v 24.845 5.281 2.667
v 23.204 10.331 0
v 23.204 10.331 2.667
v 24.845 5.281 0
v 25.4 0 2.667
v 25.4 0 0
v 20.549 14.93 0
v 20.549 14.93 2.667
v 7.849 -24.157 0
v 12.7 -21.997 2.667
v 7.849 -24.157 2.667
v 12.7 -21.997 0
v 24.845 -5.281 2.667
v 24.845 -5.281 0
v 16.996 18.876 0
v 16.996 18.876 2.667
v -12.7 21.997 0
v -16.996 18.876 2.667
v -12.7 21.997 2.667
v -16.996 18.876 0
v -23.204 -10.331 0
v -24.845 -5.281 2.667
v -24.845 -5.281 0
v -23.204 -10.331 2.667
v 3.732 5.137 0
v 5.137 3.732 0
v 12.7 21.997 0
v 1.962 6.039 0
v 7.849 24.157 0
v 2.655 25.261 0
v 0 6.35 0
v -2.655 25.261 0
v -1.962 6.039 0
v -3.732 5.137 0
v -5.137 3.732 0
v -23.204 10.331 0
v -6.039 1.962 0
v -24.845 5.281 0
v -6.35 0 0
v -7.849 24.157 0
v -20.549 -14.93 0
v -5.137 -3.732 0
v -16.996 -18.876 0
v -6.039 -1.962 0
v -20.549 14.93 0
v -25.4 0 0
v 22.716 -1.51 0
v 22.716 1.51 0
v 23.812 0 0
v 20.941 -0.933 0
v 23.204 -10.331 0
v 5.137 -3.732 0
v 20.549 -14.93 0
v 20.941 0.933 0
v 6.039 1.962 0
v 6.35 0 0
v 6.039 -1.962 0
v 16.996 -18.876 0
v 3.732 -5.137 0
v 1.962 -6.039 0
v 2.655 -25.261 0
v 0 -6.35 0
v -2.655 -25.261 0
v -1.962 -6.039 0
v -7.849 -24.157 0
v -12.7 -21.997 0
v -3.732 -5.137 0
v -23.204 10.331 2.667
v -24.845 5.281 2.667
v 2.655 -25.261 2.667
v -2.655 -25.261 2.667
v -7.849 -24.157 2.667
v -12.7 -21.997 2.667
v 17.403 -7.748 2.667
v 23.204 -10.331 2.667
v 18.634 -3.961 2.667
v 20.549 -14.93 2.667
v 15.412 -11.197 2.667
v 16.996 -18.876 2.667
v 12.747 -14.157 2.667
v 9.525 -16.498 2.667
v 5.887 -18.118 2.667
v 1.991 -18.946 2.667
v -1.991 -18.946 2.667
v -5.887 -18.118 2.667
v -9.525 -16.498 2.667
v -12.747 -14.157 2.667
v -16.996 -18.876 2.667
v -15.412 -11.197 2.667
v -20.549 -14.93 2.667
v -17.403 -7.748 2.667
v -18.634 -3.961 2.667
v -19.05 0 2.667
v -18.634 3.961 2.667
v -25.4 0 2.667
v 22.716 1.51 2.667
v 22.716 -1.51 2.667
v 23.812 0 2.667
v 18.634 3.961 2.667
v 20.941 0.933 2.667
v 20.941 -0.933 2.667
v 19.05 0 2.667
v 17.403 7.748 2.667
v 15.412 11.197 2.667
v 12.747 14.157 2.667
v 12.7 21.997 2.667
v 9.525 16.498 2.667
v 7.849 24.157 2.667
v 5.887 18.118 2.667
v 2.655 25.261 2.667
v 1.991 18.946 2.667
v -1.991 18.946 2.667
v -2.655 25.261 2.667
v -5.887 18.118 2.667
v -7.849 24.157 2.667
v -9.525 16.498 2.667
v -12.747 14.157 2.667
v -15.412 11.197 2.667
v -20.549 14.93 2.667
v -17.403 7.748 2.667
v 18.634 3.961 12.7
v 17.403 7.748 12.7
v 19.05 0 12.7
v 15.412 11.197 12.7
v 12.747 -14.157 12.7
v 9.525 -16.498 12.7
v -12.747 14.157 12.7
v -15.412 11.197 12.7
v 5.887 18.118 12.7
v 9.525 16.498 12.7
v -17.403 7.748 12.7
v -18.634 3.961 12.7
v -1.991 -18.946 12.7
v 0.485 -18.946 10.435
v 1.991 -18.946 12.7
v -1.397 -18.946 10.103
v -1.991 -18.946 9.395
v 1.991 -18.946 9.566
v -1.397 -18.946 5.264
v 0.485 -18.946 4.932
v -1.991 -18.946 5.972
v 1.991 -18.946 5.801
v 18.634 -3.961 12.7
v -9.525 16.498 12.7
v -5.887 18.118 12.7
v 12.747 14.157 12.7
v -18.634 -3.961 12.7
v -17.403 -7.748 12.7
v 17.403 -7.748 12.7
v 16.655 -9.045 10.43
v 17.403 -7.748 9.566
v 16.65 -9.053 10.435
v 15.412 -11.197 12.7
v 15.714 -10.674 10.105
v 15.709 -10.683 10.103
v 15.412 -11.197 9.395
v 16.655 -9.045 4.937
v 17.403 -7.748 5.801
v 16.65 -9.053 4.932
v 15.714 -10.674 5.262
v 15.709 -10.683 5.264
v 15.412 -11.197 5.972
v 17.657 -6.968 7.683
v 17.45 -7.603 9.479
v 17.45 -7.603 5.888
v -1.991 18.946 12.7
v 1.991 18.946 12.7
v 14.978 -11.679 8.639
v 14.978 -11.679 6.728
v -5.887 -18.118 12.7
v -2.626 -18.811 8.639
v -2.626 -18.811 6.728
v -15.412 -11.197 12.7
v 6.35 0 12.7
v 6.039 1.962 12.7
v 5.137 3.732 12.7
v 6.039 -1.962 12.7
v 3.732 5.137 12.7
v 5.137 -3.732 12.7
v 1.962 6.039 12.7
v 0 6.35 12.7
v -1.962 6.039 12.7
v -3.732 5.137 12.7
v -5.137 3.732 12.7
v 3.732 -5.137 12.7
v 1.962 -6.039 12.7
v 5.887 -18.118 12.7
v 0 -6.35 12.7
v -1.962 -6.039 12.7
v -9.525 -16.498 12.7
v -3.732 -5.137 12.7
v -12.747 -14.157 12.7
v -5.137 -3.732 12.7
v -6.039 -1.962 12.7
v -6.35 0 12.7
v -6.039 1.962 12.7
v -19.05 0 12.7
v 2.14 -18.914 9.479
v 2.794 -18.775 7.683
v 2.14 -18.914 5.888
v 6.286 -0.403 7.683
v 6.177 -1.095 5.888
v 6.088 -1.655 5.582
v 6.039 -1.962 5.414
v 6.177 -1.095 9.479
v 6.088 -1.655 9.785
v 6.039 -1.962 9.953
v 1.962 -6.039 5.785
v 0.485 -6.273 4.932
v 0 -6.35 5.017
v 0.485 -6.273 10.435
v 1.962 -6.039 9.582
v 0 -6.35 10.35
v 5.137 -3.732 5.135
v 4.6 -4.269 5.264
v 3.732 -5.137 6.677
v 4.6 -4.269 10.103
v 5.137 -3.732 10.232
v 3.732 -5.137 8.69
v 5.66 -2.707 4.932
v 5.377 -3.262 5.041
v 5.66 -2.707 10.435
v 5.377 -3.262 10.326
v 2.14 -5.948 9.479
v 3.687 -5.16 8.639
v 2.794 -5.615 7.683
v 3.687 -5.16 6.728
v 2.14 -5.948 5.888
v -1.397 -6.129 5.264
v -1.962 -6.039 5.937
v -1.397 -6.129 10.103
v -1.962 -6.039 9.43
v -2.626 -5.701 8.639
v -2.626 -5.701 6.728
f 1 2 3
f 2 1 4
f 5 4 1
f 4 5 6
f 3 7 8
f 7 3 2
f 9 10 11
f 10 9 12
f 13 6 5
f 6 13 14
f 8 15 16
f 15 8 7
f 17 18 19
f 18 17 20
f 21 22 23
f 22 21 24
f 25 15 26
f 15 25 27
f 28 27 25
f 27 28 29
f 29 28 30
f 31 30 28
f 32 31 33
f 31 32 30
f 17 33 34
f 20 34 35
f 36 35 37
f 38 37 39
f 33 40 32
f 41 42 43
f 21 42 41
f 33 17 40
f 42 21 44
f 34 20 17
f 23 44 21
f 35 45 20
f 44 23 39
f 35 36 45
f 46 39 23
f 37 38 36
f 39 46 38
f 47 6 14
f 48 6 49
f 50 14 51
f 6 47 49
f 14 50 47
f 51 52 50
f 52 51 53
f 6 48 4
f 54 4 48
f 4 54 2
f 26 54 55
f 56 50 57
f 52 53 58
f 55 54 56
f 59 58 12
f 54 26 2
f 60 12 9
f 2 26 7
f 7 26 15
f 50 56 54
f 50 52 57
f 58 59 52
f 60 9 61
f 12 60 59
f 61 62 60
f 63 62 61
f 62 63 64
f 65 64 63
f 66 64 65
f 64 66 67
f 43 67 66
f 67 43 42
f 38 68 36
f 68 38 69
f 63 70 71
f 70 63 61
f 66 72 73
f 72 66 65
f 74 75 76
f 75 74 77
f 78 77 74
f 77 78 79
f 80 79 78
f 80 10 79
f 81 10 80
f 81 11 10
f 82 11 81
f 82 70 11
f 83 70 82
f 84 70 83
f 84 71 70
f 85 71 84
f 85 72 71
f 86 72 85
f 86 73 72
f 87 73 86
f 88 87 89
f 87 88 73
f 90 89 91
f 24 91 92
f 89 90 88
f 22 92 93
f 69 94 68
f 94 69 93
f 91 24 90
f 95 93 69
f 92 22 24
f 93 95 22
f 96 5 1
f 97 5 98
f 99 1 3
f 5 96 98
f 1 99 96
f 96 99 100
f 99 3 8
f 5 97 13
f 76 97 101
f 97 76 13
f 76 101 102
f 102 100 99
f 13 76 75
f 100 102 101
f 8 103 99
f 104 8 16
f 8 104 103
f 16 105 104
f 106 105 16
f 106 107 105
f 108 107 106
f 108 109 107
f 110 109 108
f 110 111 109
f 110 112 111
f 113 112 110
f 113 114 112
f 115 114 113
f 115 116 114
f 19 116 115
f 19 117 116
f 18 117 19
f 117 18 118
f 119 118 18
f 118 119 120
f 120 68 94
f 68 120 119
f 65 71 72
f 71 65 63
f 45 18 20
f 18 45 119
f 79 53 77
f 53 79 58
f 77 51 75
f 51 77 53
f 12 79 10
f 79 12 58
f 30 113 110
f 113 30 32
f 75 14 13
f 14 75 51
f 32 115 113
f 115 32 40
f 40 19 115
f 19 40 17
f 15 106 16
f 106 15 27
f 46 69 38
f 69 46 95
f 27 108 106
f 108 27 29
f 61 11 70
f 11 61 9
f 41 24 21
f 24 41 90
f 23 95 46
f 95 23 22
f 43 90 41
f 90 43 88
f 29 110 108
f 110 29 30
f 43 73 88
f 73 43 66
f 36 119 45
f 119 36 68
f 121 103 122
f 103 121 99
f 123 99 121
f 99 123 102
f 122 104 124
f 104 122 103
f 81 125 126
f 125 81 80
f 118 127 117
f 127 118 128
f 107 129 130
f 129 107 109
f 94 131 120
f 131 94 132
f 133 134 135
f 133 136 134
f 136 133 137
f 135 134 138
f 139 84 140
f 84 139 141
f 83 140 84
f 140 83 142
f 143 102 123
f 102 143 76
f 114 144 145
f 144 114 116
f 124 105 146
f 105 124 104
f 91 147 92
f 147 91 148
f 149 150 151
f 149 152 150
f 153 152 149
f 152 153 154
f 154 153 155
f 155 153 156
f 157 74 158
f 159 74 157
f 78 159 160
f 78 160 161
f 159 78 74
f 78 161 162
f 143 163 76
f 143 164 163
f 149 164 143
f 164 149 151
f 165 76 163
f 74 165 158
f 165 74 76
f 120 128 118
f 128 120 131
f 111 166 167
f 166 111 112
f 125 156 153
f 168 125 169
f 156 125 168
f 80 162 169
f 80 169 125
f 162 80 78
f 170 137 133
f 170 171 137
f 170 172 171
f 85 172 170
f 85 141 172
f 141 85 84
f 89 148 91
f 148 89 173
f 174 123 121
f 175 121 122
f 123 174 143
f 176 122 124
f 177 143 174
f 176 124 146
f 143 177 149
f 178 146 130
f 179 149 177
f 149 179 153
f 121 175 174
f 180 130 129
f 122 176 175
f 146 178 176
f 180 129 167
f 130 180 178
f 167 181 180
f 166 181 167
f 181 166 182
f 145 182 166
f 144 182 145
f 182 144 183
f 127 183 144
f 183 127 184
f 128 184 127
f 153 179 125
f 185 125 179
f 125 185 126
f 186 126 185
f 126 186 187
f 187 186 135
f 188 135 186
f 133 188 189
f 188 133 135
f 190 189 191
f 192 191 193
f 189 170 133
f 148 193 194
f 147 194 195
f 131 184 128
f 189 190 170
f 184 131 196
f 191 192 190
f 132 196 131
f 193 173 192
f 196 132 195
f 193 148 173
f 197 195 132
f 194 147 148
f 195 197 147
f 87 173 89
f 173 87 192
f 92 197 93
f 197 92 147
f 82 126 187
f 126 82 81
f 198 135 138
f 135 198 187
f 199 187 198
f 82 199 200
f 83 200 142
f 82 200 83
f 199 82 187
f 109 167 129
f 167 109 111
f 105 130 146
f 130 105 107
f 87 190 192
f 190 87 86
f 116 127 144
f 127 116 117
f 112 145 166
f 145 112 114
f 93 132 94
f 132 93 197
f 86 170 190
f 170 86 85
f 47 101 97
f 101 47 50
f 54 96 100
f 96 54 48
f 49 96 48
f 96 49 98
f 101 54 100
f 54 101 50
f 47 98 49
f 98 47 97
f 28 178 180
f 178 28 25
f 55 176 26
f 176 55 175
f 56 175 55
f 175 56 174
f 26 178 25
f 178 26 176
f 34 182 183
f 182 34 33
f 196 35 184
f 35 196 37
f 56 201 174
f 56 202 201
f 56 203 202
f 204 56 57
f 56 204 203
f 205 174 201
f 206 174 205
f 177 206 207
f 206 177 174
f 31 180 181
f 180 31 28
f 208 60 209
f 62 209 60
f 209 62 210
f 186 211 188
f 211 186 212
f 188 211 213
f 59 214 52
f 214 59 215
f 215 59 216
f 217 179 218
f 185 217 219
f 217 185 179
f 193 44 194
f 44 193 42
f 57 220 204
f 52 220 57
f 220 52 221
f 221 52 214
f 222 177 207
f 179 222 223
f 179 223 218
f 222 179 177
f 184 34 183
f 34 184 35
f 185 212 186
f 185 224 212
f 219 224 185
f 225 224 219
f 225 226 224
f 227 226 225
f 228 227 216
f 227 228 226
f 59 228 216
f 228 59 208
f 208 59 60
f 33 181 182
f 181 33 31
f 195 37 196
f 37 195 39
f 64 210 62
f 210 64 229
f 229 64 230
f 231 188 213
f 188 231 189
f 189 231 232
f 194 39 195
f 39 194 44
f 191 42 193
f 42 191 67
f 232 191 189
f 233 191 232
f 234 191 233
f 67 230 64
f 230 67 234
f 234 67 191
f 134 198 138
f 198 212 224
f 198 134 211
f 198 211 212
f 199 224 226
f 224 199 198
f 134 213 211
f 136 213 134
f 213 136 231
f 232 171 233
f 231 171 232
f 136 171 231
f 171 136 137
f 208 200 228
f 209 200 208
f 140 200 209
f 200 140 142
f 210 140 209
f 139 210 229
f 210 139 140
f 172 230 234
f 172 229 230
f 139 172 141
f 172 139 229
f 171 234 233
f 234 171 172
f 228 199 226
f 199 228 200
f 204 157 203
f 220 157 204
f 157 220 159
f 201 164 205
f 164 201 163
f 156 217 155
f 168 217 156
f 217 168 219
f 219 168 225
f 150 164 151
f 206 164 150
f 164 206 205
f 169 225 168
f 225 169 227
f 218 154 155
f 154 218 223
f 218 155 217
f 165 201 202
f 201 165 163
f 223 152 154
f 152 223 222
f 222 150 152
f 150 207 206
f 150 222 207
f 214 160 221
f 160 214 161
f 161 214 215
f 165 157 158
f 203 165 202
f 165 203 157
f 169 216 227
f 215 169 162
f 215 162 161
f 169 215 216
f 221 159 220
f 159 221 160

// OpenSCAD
function mm(i) = i*25.4 ;
thickness = mm(.5);
width = mm(1.5);




module base()
{
	union()
	{
		cylinder(mm(.105),mm(2)/2, mm(2)/2, 0);
		cylinder(thickness,width/2,width/2,0);
	}
		
}


module centerHole()
{
	cylinder(mm(thickness+mm(1)),mm(.5)/2, mm(.5)/2, 0);
}


module sideHole()
{
		{rotate([90, 0, 0]) {
		cylinder(mm(.75),mm(.22)/2,mm(.22)/2,0);
		}
	}
}


module toothgap()

{
union(){
	translate([mm(7/8),0,0])	{
		cylinder(mm(.2),mm(1/8)/2,mm(1/8)/2,0);
		}	
	translate([mm(7.4/8),0,0]) {
		rotate([0,0,90]){
			polyhedron( 
      	   points = [ 
              [-3, -2, 4], 
              [3, -2, 4], 
              [0, 2, 4], 
              [-3, -2, -1], 
              [3, -2, -1], 
              [0, 2, -1]
        	 ],
        	 triangles = [
              [0, 1, 2],
              [3, 4, 5],
              [0, 1, 4, 3],
              [0, 2, 5, 3],
              [1, 2, 5, 4]
         ]
    );
			}
		}
	}
}


module sprocket()
{
	difference(){
		base();
		translate([0,0,mm(-.5)]) {
			centerHole();
			}
		translate([0,0,(thickness/2+mm(.105)/2)]) {
			sideHole();
			}
		{rotate([0, 0, 60]) {
		translate([0,0,(thickness/2+mm(.105)/2)]) {
			sideHole();
				}
			}
		}
		toothgap();


	}
}


sprocket();
